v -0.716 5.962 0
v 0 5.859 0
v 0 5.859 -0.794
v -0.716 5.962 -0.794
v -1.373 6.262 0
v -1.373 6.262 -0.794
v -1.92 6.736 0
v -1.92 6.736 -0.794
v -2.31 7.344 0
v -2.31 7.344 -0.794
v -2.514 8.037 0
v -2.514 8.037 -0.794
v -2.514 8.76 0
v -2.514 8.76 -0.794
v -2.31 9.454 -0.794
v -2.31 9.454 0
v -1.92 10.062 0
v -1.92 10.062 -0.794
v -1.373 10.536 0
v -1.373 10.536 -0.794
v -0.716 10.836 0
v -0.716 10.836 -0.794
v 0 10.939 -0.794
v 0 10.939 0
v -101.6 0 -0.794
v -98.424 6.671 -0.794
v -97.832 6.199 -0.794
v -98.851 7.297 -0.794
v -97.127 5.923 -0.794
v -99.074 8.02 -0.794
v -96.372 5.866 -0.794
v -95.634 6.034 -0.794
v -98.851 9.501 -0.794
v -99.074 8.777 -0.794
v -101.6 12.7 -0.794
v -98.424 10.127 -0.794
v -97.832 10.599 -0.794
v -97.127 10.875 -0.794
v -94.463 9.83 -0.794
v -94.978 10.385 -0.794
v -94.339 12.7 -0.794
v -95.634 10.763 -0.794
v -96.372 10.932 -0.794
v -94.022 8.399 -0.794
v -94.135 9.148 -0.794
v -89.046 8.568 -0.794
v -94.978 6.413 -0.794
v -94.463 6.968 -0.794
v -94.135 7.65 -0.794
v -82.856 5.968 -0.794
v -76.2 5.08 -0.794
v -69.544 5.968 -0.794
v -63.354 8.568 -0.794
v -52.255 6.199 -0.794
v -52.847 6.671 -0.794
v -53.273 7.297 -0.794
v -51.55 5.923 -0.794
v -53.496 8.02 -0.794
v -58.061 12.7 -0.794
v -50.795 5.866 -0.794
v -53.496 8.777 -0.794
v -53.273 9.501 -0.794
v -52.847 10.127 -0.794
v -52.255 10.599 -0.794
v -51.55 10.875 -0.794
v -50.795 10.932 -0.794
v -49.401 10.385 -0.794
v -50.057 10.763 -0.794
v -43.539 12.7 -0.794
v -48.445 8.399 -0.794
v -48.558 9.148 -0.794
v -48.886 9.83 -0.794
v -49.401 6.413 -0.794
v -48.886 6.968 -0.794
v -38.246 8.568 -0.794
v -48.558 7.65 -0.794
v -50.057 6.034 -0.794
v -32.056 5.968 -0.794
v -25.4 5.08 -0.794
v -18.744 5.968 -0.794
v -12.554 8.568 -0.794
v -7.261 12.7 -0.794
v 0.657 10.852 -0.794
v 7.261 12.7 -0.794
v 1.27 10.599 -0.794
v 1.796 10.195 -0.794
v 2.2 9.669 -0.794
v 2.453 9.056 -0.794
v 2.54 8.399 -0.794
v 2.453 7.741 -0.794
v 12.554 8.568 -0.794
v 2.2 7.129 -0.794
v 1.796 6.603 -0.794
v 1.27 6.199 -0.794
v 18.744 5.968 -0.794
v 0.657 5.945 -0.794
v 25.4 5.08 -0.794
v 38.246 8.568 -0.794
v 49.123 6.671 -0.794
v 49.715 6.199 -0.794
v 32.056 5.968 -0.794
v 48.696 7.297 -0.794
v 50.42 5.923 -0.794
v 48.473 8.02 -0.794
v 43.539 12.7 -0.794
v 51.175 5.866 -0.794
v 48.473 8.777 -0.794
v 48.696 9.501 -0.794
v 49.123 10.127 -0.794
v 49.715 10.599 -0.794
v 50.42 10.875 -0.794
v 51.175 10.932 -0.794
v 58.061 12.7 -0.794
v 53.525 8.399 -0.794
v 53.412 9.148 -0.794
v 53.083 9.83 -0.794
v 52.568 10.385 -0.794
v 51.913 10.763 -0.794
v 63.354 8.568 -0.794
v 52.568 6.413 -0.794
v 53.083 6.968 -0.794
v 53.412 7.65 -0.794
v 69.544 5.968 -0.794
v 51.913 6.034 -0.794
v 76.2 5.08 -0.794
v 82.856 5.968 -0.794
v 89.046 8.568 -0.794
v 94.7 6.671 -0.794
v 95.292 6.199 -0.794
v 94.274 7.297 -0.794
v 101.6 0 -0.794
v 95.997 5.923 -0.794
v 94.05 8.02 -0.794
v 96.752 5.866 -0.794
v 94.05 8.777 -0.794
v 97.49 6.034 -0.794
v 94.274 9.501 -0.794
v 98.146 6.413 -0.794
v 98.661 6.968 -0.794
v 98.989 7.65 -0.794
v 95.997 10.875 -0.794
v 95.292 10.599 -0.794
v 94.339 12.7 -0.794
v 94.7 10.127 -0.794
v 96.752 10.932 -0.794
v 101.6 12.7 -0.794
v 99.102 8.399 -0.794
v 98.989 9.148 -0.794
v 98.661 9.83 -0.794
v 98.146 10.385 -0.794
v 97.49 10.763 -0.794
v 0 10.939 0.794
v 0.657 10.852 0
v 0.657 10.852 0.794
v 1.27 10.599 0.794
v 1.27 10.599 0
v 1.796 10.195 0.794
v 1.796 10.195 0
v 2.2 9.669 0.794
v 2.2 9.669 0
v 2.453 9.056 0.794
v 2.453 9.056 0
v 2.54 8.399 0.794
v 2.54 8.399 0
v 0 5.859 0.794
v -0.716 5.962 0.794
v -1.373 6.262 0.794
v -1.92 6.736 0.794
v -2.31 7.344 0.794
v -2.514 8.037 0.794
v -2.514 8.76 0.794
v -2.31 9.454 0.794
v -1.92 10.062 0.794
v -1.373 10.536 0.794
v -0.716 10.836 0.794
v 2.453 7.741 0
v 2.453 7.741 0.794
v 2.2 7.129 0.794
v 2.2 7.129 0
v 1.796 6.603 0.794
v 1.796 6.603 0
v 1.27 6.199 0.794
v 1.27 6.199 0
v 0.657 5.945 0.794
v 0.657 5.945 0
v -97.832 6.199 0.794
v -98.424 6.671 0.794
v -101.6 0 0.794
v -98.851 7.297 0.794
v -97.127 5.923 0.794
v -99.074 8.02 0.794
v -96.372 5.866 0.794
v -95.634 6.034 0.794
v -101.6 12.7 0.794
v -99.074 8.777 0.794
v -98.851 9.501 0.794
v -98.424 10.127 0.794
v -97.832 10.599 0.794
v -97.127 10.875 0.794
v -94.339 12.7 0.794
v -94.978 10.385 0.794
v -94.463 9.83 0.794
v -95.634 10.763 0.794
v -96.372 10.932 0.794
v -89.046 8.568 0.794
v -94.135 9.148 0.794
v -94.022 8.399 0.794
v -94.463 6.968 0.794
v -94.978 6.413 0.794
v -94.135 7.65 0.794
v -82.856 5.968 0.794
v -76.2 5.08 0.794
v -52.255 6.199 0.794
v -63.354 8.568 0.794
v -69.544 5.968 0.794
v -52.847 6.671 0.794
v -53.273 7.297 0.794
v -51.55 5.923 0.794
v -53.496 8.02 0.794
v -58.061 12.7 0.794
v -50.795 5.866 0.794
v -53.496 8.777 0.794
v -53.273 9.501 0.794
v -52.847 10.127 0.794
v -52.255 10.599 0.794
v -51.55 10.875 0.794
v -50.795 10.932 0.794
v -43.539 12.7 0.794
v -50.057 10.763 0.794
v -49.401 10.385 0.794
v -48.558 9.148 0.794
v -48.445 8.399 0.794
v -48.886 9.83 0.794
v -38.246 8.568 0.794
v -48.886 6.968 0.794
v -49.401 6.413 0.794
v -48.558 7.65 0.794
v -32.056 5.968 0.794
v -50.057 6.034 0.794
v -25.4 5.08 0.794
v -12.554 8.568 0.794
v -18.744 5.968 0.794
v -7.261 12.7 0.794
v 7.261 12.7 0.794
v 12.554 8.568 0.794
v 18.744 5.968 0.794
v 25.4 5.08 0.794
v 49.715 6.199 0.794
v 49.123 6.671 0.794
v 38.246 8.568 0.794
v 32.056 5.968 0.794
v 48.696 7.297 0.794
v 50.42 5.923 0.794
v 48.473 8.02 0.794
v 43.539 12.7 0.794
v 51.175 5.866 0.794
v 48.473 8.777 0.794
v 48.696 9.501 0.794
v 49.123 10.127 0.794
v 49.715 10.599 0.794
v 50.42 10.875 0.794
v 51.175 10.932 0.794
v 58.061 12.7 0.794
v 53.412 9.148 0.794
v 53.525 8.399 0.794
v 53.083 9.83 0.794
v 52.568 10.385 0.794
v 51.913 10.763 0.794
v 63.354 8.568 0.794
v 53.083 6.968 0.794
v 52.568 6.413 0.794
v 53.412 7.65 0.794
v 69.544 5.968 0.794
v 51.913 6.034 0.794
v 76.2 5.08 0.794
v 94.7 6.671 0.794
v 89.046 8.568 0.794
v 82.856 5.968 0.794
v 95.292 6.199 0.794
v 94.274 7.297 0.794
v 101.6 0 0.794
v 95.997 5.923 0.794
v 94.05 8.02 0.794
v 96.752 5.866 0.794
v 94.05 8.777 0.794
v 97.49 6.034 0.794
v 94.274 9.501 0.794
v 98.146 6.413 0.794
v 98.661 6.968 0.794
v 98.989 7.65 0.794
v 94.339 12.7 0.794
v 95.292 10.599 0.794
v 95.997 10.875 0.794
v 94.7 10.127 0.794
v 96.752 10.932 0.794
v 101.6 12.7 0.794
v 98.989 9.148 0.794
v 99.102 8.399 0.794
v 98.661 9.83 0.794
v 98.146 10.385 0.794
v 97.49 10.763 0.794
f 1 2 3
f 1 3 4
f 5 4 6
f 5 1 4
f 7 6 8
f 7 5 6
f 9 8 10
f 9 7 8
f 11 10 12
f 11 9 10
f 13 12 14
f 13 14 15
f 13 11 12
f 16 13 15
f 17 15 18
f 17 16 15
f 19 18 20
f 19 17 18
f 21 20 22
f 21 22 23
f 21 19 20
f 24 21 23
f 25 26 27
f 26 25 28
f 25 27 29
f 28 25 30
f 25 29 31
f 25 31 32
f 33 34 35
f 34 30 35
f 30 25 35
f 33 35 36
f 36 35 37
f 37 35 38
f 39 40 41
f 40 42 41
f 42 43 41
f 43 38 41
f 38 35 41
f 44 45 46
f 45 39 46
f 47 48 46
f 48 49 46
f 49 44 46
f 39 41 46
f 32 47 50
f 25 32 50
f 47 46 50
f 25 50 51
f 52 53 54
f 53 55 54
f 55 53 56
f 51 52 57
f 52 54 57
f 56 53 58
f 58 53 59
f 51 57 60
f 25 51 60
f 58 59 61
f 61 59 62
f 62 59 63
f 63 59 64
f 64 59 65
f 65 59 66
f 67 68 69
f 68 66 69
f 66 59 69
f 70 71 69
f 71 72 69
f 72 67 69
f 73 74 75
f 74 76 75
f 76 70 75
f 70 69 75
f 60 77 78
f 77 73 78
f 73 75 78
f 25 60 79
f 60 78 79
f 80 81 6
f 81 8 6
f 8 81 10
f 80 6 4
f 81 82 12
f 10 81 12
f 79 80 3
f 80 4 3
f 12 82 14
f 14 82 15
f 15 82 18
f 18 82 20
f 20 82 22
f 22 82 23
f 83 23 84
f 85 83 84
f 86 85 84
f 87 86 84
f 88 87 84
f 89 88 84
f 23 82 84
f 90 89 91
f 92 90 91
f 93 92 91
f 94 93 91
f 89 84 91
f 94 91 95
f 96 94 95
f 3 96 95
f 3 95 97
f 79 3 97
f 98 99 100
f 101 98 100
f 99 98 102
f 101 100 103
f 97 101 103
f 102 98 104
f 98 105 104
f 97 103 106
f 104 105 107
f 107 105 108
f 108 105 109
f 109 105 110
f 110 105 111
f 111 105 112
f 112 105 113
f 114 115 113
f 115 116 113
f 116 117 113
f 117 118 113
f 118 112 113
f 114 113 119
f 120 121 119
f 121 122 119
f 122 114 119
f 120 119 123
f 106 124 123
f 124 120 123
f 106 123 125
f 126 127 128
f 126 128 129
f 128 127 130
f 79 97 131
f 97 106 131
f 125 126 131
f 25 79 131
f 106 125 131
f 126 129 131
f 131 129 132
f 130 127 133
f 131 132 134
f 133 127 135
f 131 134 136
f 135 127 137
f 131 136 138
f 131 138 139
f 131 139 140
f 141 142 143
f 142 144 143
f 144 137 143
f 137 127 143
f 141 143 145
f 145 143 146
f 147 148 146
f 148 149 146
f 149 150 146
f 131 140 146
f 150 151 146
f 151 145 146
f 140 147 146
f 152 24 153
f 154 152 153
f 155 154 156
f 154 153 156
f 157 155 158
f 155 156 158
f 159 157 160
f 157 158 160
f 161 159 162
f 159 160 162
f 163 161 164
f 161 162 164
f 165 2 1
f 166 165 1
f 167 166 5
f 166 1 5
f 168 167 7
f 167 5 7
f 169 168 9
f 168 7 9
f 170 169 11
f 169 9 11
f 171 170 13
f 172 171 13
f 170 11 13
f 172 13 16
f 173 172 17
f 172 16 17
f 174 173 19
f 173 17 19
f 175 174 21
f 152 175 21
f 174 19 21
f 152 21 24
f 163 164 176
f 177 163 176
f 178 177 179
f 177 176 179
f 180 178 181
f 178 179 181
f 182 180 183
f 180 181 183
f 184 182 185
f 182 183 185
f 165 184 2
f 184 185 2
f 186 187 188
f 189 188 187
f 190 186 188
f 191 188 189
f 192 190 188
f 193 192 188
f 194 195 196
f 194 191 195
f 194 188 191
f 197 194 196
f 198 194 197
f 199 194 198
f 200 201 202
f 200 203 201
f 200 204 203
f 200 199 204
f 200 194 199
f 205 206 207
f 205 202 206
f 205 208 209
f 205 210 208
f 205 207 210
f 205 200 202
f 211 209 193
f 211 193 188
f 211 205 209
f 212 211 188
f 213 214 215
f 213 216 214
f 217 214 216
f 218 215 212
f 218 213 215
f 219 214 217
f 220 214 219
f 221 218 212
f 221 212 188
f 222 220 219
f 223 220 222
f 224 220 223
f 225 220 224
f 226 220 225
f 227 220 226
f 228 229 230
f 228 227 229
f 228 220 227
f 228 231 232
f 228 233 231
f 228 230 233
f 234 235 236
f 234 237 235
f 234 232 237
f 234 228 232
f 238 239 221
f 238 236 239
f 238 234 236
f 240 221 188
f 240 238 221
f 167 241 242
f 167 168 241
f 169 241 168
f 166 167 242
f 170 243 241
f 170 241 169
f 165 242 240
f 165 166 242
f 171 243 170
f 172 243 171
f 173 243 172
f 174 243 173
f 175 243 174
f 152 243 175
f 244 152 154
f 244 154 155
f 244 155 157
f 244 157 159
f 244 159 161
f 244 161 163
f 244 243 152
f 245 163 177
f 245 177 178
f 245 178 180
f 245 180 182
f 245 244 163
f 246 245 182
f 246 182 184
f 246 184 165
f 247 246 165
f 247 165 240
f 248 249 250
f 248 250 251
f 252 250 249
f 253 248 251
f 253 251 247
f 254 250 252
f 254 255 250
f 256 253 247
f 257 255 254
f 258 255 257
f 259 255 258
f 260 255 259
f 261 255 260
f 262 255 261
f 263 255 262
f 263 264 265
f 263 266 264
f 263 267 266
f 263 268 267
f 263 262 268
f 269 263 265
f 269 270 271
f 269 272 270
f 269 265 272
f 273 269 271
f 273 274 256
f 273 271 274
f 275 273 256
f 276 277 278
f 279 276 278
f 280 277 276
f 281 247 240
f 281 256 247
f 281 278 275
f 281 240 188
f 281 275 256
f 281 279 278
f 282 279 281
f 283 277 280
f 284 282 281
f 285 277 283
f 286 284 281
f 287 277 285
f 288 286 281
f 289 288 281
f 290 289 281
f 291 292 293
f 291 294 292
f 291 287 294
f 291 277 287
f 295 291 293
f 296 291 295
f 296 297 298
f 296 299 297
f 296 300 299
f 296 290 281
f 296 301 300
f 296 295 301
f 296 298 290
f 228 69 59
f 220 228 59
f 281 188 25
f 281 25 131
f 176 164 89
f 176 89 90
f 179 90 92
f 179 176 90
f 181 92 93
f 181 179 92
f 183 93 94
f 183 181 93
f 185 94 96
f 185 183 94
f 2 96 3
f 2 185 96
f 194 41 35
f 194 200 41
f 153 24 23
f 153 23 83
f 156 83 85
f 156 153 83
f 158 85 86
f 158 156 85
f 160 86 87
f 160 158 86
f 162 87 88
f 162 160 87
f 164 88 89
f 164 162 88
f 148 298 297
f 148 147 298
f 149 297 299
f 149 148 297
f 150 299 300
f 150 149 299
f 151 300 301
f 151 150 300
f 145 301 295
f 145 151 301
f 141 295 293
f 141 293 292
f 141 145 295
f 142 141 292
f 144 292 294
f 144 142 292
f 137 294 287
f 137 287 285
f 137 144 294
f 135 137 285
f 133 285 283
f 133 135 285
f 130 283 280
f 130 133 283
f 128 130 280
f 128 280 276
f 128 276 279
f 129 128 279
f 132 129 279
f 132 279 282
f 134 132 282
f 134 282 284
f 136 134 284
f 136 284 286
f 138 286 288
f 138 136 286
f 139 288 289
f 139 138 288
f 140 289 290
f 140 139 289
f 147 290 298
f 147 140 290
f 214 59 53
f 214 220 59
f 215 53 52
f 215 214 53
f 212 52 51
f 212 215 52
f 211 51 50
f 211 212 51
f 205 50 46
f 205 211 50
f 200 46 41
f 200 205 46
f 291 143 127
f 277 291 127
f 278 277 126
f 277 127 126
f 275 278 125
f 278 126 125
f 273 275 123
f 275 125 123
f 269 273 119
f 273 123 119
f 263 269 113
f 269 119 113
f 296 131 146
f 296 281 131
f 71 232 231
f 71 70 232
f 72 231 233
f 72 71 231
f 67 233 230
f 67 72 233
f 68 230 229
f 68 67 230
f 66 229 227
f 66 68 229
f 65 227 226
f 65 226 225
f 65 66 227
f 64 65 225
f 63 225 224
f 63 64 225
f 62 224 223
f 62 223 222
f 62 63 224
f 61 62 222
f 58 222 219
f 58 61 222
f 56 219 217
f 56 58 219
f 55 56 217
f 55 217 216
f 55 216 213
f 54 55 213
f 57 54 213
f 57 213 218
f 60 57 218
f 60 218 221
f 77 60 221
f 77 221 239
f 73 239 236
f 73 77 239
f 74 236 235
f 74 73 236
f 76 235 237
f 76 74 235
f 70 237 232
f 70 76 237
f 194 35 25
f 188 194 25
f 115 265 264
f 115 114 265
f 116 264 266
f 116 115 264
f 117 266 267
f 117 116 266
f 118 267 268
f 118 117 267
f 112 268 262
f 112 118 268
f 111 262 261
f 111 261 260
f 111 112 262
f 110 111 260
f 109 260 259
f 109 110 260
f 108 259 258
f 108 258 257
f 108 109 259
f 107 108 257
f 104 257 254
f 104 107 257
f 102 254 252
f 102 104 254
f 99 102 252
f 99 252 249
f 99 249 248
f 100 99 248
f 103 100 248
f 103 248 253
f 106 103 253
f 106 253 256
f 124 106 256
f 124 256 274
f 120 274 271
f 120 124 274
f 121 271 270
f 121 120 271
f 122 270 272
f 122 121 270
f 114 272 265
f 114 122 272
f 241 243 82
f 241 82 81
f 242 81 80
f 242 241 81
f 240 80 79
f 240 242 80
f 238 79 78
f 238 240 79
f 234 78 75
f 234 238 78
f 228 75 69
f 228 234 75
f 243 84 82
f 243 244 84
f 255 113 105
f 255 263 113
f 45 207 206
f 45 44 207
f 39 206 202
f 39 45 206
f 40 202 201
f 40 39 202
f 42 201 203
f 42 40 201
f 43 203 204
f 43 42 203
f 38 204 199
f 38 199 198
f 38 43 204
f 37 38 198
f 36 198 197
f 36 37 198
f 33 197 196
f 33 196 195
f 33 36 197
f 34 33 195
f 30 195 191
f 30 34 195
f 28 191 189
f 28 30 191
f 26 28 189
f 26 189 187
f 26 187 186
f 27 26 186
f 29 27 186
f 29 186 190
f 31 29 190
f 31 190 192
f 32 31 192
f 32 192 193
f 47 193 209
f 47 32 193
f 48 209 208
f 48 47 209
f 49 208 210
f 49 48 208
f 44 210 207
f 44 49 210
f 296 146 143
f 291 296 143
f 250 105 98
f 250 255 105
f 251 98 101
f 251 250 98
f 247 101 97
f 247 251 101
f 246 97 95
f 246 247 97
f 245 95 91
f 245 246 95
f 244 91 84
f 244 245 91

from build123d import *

# Parameters (mm, degrees)
SKETCH1_R           = 2.54
BOSS_EXTRUDE1_DEPTH = 0.79375


with BuildPart() as part:
    # Sketch1 → Boss-Extrude1 (new, symmetric)
    # profile 1 of 2: a face of its own
    with BuildSketch(Plane.XY):
        with BuildLine():
            Line((0, 10.938896076), (0, 12.7))
            Line((0, 12.7), (-7.260771792, 12.7))
            ThreePointArc((-7.260771792, 12.7), (-25.4, 5.08), (-43.539228208, 12.7))
            Line((-43.539228208, 12.7), (-58.060771792, 12.7))
            ThreePointArc((-58.060771792, 12.7), (-76.2, 5.08), (-94.339228208, 12.7))
            Line((-94.339228208, 12.7), (-101.6, 12.7))
            Line((-101.6, 12.7), (-101.6, 0))
            Line((-101.6, 0), (0, 0))
            Line((0, 0), (0, 5.858896076))
            ThreePointArc((0, 5.858896076), (-2.54, 8.398896076), (0, 10.938896076))
        make_face()
        with Locations((-96.562042846, 8.398896076)):
            Circle(SKETCH1_R, mode=Mode.SUBTRACT)
        with Locations((-50.984733006, 8.398896076)):
            Circle(SKETCH1_R, mode=Mode.SUBTRACT)
    # profile 2 of 2: a face of its own
    with BuildSketch(Plane.XY):
        with BuildLine():
            Line((7.260771792, 12.7), (0, 12.7))
            Line((0, 12.7), (0, 10.938896076))
            ThreePointArc((0, 10.938896076), (1.796051224, 10.1949473), (2.54, 8.398896076))
            ThreePointArc((2.54, 8.398896076), (1.796051224, 6.602844851), (0, 5.858896076))
            Line((0, 5.858896076), (0, 0))
            Line((0, 0), (101.6, 0))
            Line((101.6, 0), (101.6, 12.7))
            Line((101.6, 12.7), (94.339228208, 12.7))
            ThreePointArc((94.339228208, 12.7), (76.2, 5.08), (58.060771792, 12.7))
            Line((58.060771792, 12.7), (43.539228208, 12.7))
            ThreePointArc((43.539228208, 12.7), (25.4, 5.08), (7.260771792, 12.7))
        make_face()
        with Locations((50.984733006, 8.398896076)):
            Circle(SKETCH1_R, mode=Mode.SUBTRACT)
        with Locations((96.562042846, 8.398896076)):
            Circle(SKETCH1_R, mode=Mode.SUBTRACT)
    extrude(amount=BOSS_EXTRUDE1_DEPTH, both=True)


solid = part.part
